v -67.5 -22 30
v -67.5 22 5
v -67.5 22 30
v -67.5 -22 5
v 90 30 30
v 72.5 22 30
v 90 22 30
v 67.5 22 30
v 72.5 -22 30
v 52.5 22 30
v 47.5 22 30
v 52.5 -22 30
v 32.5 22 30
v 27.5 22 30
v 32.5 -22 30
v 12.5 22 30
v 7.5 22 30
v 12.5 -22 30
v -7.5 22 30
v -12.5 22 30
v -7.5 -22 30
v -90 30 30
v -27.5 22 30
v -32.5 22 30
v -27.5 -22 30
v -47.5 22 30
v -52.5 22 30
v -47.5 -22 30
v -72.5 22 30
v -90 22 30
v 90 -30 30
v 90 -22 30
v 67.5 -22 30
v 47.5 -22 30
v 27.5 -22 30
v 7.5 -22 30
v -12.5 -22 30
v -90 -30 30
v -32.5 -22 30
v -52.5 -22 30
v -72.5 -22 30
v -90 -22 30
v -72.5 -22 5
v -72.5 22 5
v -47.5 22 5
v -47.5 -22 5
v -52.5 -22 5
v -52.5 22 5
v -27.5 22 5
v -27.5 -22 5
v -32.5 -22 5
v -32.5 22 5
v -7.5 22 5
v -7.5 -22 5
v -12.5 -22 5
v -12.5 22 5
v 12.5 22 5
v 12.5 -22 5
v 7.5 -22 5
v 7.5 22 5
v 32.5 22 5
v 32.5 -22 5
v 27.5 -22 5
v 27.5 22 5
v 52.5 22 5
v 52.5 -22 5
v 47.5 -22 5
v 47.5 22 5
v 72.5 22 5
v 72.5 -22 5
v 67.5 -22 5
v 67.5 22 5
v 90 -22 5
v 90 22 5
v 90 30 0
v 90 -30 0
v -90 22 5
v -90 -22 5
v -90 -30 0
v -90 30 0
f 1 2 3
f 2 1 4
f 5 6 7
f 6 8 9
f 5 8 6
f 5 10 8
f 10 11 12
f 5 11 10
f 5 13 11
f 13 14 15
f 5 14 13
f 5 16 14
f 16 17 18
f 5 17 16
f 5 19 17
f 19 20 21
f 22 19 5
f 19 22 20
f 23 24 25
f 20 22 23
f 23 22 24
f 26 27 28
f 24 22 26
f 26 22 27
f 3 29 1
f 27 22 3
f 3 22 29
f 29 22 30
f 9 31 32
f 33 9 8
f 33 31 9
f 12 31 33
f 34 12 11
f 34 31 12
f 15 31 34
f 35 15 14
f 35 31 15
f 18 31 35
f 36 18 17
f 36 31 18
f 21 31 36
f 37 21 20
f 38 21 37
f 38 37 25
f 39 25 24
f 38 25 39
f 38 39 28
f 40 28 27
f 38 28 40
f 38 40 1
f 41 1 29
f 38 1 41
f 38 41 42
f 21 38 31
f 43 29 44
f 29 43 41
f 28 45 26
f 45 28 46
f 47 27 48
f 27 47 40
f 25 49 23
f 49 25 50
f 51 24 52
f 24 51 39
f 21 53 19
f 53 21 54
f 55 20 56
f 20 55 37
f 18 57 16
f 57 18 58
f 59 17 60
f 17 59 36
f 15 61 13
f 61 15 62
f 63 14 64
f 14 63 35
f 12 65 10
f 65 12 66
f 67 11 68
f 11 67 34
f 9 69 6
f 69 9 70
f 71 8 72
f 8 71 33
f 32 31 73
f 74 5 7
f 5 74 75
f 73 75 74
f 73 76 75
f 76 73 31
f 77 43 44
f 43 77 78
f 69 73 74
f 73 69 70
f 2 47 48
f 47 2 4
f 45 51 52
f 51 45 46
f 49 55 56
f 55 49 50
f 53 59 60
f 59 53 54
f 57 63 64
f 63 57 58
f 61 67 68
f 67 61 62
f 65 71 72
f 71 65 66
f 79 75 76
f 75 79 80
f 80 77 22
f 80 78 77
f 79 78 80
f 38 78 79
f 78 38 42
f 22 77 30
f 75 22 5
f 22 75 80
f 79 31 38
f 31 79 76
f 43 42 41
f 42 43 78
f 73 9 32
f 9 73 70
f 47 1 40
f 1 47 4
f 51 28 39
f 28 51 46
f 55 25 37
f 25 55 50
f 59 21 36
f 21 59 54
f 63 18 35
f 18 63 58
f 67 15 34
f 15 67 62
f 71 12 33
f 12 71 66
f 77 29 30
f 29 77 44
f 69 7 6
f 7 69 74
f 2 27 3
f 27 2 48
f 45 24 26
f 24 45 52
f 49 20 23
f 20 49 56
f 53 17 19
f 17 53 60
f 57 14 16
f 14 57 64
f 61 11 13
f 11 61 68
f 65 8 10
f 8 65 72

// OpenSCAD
$fn = 32;

// ----------------------------------------------------------------------
// Rib frame 180 x 60 x 30
// 8 ribs at 20 mm pitch
// ----------------------------------------------------------------------

// --- parameters (mm) ---
frame = [180, 60, 5];  // base plate size (x, y, z)
rail_w = 8;            // side rail width
ribs = 8;              // number of ribs
rib_t = 5;             // rib thickness
rib_h = 25;            // rib height above the base plate
pitch = 20;            // pitch between rib centres

// --- derived feature positions (mm) ---
span = (ribs - 1) * pitch;          // = 140   distance between the outer ribs
origin_x = -span / 2;               // = -70   X of the first rib
rib_len = frame[1] - 2 * rail_w + 2;  // = 46   rib length, 1 mm into each rail
feature_centers = [
  [origin_x + 0 * pitch, 0],
  [origin_x + 1 * pitch, 0],
  [origin_x + 2 * pitch, 0],
  [origin_x + 3 * pitch, 0],
  [origin_x + 4 * pitch, 0],
  [origin_x + 5 * pitch, 0],
  [origin_x + 6 * pitch, 0],
  [origin_x + 7 * pitch, 0]
];   // rib centre line, drives the rib loop

// base plate, two side rails, then the ribs read straight off feature_centers
union() {
  translate([-frame[0] / 2, -frame[1] / 2, 0]) cube(frame);
  translate([-frame[0] / 2, -frame[1] / 2, 0]) cube([frame[0], rail_w, frame[2] + rib_h]);
  translate([-frame[0] / 2, frame[1] / 2 - rail_w, 0]) cube([frame[0], rail_w, frame[2] + rib_h]);
  for (centre = feature_centers)
    translate([centre[0] - rib_t / 2, centre[1] - rib_len / 2, frame[2] - 1])
      cube([rib_t, rib_len, rib_h + 1]);
}
